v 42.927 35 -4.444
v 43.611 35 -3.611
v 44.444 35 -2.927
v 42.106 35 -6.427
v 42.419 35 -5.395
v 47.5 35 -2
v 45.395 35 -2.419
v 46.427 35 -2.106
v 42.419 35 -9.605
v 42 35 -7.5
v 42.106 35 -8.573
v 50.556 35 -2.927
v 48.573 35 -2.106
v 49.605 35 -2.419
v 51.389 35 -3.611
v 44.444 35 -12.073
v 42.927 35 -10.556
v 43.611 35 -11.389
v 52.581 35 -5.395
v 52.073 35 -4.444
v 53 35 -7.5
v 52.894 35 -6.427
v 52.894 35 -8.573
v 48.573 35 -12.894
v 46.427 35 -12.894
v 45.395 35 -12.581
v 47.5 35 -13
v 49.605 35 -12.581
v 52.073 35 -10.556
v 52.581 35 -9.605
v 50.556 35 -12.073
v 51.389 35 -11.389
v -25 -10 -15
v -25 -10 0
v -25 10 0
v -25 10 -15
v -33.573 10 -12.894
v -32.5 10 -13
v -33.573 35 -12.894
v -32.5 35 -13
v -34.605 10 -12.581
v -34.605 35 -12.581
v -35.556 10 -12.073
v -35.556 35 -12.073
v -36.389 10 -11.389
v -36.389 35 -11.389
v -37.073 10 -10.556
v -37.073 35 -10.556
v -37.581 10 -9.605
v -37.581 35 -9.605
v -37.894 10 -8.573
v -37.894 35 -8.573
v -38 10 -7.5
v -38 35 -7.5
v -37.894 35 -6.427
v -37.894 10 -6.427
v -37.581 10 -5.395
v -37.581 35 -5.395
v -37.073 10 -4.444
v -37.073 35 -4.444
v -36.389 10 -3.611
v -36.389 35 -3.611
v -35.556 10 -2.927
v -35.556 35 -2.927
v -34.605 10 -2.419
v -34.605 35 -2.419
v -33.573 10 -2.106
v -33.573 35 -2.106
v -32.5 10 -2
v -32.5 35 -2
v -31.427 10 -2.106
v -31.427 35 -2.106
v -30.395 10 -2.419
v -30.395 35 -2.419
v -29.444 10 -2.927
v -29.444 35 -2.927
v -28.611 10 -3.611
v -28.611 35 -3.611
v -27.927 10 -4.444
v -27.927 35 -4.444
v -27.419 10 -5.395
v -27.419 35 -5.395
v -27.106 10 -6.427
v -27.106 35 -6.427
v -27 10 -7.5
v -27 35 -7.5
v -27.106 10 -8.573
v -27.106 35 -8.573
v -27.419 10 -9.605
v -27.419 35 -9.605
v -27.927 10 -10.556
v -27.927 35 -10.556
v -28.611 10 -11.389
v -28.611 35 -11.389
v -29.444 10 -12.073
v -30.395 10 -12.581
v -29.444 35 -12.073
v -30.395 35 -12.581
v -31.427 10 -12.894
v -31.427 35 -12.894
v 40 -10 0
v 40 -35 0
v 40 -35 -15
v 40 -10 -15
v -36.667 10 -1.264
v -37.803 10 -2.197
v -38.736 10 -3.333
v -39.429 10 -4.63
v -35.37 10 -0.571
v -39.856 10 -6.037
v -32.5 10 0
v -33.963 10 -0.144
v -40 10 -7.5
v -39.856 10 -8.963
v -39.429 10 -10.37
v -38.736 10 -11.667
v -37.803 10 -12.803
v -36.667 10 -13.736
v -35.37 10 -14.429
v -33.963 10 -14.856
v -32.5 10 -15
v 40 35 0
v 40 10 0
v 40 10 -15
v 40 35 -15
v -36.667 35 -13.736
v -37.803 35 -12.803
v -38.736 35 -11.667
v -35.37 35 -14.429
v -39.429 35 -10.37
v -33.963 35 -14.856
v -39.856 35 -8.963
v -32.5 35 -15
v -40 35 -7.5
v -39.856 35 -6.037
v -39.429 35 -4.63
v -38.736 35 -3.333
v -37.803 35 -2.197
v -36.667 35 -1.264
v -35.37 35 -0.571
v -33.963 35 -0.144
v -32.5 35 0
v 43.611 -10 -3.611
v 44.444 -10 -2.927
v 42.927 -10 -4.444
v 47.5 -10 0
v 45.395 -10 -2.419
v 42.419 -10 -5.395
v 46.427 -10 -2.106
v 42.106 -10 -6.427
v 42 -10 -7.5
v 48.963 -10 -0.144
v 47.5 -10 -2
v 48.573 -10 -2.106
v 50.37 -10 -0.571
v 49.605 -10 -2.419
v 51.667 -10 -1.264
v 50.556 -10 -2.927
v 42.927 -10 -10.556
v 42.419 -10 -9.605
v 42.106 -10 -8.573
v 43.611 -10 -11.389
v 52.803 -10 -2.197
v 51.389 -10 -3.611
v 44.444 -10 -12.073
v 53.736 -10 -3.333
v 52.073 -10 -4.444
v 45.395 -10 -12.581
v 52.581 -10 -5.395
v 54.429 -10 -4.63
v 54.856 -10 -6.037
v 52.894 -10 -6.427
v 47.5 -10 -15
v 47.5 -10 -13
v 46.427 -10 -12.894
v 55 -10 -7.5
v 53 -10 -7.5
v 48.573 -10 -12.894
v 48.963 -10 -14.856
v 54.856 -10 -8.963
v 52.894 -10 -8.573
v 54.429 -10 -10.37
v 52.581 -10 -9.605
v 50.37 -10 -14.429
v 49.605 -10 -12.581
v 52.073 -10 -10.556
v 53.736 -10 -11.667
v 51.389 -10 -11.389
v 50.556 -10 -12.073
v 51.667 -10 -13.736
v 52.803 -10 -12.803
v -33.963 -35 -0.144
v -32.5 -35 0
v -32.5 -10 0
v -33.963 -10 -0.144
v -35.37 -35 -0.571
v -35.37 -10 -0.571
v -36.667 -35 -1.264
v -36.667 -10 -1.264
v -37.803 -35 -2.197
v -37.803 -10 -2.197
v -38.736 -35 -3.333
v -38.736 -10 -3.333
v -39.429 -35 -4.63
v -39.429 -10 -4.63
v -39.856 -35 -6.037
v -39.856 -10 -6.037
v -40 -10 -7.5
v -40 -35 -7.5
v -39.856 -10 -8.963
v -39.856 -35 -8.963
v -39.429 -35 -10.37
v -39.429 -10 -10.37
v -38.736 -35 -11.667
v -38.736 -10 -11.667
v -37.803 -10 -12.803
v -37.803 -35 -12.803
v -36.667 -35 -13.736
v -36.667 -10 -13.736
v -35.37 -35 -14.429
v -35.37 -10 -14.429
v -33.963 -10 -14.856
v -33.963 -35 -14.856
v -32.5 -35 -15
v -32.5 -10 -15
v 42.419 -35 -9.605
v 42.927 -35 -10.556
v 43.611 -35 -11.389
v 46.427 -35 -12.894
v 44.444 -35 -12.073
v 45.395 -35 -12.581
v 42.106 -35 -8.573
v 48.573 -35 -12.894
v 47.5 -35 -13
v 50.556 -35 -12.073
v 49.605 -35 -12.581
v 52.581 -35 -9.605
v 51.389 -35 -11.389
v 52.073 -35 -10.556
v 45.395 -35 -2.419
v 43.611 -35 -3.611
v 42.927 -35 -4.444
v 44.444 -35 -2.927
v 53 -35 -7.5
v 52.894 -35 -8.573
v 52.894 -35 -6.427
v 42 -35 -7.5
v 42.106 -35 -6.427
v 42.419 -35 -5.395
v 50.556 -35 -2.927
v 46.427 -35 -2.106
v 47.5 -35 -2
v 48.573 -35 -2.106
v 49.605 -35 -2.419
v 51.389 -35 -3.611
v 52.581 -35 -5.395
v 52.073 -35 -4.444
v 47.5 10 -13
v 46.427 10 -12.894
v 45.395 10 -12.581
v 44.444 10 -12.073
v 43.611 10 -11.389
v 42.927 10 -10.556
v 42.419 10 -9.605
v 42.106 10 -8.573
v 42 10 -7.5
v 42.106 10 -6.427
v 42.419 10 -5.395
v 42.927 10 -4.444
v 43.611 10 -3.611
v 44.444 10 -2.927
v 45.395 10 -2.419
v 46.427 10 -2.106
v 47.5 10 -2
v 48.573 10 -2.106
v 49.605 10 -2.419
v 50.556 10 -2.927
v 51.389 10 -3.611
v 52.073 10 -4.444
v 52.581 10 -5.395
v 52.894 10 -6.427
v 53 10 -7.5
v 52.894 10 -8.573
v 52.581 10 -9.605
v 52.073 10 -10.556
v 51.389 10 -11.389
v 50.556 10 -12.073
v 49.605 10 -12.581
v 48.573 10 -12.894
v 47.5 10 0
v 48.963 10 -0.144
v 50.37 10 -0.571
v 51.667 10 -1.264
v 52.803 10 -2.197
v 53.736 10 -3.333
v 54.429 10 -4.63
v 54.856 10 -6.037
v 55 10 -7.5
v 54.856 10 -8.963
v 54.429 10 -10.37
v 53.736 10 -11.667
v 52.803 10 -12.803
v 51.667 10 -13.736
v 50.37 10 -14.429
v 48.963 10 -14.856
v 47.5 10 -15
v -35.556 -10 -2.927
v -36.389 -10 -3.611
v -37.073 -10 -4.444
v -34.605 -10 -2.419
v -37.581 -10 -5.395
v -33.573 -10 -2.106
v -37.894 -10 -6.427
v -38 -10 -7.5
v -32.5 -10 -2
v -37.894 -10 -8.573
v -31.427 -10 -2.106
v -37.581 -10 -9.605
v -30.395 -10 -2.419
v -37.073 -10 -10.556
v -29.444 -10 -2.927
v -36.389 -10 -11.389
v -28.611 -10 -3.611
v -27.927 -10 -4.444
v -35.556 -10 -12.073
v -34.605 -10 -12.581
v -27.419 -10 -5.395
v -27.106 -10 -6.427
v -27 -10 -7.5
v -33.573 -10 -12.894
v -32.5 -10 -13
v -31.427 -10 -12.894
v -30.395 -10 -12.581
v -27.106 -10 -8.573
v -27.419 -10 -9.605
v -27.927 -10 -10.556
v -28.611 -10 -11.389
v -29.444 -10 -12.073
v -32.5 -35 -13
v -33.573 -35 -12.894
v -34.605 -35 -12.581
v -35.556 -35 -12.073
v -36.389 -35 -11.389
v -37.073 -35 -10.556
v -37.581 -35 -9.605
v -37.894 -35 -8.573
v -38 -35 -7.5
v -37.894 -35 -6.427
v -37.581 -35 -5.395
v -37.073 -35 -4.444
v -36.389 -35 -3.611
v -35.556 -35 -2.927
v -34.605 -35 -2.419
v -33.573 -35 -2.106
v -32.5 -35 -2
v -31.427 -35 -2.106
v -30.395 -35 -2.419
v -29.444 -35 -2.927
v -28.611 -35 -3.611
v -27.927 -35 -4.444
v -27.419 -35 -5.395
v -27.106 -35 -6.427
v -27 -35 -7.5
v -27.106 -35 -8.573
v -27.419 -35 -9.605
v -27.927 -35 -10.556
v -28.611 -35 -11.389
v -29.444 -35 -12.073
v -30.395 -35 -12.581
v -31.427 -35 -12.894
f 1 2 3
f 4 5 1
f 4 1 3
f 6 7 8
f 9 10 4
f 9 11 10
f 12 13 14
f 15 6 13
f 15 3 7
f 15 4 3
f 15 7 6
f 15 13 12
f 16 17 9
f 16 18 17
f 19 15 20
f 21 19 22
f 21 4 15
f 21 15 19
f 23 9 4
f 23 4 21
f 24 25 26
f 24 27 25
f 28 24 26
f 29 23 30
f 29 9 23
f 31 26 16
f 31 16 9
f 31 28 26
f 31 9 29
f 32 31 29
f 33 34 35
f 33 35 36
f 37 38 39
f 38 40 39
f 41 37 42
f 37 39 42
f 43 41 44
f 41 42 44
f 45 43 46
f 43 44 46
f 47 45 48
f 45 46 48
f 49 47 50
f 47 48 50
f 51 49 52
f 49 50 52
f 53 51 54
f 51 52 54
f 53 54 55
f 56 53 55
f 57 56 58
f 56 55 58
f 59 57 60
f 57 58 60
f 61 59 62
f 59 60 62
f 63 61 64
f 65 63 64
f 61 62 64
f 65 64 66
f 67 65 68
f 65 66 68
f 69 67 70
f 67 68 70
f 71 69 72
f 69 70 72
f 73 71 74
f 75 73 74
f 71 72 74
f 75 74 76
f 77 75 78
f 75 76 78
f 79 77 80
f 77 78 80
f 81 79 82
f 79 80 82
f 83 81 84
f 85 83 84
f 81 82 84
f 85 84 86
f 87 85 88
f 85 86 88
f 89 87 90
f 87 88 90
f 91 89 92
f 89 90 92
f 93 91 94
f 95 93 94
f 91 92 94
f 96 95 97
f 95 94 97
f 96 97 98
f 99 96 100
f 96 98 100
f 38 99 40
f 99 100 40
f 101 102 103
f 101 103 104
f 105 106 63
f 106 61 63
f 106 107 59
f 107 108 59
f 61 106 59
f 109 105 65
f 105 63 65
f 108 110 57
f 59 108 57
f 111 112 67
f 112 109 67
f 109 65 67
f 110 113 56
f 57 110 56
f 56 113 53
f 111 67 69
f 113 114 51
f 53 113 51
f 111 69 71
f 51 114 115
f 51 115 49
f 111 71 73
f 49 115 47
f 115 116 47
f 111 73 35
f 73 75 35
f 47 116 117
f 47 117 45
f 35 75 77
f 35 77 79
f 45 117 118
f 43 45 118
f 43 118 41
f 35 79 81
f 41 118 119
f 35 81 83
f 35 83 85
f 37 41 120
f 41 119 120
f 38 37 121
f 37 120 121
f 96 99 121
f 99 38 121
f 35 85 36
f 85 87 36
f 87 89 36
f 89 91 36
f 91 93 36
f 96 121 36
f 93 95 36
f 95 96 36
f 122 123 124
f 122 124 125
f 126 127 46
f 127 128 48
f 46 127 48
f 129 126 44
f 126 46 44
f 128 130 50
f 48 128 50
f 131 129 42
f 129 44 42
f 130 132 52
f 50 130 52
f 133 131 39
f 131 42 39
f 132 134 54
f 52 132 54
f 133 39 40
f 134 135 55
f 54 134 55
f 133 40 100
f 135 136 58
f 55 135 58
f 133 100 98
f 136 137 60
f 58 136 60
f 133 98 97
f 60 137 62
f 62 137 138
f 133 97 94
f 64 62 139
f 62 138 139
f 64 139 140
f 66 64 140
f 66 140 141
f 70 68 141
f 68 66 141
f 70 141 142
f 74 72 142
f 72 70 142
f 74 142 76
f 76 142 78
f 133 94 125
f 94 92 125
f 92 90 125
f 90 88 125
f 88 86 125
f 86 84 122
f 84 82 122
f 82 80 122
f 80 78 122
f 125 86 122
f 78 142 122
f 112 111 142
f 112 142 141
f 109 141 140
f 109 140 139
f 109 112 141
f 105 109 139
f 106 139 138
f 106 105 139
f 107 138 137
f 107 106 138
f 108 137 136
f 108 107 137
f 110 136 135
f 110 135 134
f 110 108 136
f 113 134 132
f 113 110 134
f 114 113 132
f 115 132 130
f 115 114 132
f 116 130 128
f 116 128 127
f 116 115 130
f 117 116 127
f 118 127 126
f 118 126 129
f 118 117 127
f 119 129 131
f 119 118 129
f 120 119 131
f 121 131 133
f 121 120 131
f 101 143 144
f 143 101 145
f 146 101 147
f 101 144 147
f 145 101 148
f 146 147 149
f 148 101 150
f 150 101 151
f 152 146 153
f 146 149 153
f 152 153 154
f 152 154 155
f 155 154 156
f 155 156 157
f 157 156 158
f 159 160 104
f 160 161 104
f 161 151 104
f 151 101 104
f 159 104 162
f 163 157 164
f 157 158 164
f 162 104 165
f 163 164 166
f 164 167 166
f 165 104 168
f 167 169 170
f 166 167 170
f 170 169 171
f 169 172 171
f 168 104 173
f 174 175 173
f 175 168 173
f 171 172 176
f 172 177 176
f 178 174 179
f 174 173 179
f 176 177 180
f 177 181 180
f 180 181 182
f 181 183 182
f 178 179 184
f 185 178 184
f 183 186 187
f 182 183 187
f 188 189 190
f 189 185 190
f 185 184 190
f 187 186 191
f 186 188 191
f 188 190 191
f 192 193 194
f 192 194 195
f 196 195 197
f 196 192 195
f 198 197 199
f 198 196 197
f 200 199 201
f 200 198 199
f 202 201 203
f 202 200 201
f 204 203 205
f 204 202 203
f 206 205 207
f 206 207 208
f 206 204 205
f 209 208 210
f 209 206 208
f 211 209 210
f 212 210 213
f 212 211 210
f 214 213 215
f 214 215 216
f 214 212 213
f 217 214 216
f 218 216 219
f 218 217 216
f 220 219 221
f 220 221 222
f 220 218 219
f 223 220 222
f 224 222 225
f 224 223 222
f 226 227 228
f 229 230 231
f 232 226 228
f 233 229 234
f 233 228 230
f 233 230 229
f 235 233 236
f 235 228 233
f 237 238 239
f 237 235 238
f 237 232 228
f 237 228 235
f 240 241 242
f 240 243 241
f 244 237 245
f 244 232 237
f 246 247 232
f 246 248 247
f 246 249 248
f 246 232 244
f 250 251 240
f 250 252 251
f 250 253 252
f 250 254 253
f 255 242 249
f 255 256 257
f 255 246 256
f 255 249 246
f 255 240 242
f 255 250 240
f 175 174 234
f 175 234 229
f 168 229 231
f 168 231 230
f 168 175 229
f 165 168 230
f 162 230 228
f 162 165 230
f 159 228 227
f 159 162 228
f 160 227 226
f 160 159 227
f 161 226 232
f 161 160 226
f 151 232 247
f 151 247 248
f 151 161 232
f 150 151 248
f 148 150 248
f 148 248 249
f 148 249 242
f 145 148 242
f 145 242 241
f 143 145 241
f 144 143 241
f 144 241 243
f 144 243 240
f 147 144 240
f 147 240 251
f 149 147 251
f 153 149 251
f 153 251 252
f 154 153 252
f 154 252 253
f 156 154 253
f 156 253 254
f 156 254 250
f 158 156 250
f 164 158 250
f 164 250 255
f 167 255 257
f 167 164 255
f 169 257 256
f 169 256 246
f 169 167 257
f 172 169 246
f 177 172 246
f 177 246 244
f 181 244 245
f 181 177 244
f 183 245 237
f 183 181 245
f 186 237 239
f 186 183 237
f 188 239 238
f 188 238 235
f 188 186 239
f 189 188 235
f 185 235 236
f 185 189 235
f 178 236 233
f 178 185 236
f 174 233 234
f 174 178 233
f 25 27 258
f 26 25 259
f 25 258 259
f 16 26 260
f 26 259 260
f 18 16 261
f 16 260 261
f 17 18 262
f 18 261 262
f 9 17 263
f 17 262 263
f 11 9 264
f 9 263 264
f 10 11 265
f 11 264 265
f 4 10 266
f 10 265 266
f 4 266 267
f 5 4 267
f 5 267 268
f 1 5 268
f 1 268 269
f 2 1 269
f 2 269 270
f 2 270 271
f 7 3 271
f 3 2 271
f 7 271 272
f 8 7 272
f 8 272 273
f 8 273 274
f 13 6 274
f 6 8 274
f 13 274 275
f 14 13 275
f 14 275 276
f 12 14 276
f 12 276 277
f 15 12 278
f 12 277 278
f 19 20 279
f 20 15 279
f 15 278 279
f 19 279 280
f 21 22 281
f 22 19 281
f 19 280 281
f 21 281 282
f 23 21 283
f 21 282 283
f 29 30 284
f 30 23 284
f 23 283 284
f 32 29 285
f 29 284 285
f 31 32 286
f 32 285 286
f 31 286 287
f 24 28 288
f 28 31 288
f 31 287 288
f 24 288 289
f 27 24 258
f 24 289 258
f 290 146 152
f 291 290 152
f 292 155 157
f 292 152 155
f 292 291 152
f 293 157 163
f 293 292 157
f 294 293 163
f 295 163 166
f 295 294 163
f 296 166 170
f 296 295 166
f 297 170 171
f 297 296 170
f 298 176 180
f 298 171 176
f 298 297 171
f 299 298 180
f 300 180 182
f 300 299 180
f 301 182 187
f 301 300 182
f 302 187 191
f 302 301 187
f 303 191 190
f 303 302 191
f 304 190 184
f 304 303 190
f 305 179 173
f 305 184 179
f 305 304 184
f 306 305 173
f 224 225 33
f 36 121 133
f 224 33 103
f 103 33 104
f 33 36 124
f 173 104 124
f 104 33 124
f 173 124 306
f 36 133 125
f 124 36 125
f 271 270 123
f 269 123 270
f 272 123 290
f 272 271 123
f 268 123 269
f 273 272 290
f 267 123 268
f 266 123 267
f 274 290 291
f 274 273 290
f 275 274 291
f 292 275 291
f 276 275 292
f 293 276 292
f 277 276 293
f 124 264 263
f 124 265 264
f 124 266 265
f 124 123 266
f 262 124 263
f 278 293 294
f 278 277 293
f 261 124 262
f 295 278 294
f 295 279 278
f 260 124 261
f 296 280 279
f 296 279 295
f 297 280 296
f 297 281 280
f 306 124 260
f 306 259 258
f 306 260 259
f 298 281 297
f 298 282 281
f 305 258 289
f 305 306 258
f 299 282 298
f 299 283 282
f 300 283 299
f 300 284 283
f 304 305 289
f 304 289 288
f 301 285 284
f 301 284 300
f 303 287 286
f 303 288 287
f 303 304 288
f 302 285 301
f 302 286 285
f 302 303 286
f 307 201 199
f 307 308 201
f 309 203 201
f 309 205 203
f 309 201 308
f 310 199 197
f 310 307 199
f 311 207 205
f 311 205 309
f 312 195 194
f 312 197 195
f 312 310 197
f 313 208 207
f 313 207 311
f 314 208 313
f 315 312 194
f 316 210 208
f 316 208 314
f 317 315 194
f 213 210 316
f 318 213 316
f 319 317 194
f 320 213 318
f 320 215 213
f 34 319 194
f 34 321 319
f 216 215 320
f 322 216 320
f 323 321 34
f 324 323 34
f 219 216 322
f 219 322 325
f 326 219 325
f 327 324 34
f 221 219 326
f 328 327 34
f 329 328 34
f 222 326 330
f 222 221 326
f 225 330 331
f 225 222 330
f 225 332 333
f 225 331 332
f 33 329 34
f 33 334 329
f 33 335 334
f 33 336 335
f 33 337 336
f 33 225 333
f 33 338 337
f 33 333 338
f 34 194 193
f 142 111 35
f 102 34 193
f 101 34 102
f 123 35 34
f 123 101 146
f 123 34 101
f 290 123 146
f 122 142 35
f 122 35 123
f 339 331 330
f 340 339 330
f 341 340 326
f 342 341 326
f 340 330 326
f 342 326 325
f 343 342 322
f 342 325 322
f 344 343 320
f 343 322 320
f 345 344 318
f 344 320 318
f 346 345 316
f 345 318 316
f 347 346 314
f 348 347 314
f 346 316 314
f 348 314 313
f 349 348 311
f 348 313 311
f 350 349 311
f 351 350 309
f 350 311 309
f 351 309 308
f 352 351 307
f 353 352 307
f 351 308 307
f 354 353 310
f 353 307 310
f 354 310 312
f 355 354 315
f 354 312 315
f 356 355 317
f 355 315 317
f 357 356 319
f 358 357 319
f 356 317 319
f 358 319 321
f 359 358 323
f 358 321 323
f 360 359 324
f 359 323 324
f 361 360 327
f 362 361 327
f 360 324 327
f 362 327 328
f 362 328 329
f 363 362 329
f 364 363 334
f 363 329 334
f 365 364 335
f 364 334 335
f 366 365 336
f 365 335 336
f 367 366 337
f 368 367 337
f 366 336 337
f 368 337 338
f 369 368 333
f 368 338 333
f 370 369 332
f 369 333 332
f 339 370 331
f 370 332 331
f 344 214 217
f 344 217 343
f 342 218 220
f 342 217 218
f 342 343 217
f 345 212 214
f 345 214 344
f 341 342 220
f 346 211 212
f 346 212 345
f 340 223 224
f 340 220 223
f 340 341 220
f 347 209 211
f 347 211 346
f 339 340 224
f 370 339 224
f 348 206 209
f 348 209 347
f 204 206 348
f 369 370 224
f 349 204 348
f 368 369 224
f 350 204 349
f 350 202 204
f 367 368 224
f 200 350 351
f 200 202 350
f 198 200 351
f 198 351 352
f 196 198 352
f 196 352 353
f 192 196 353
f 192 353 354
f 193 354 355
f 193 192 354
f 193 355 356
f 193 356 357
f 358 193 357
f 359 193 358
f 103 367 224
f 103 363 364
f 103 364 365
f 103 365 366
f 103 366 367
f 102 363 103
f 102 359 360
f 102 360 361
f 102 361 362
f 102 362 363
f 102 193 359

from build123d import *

# Parameters (mm, degrees)
PLATE_SKETCH_W                 = 80
PLATE_SKETCH_H                 = 70
PLATE_EXTRUDE_DEPTH            = 15
HOLE_CUT_REACH                 = 57.227
HOLE_SKETCH_R                  = 5.5
HOLE_CUT_DIRECTION_2_REACH     = 57.227
FEMALE_FILLET_RADIUS           = 7.5
FEMALE_FILLET_LENGTH           = 70
GAP_CUT_DEPTH                  = 10
GAP_CUT_DEPTH_BACK             = 10
GAP_SKETCH_W                   = 15
GAP_SKETCH_H                   = 15
PIN_SUPPORT_EXTRUDE_DEPTH      = 10
PIN_SUPPORT_EXTRUDE_DEPTH_BACK = 10
PIN_SUPPORT_SKETCH_W           = 15
PIN_SUPPORT_SKETCH_H           = 15
PIN_EXTRUDE_REACH              = 74.629
PIN_SKETCH_R                   = 5.5
PIN_EXTRUDE_DIRECTION_2_REACH  = 74.629
MALE_FILLET_RADIUS             = 7.5
MALE_FILLET_LENGTH             = 20


with BuildPart() as part:
    # Plate Sketch → Plate Extrude (new body)
    with BuildSketch(Plane.XY):
        Rectangle(PLATE_SKETCH_W, PLATE_SKETCH_H)
    extrude(amount=-PLATE_EXTRUDE_DEPTH)

    # Hole Cut: up to this face of the body (flat: up to its plane)
    hole_cut_end = Plane(part.part.faces().sort_by_distance((0, 35, -7.5))[0])
    # Hole Sketch → Hole Cut (cut, up to the picked face)
    with BuildSketch(Plane(origin=(0, 0, 0), x_dir=(1, 0, 0), z_dir=(0, 1, 0)), mode=Mode.PRIVATE) as hole_cut_sk1:
        with Locations(Location((-32.5, 7.5, 0), (0, 0, 90))):
            Circle(HOLE_SKETCH_R)
    hole_cut_tool1 = split(extrude(hole_cut_sk1.sketch, amount=HOLE_CUT_REACH, mode=Mode.PRIVATE), bisect_by=hole_cut_end, keep=Keep.BOTH, mode=Mode.PRIVATE)
    add(hole_cut_tool1.solids().sort_by(Axis((-32.5, 0, -7.5), (0, 1, 0)))[0], mode=Mode.SUBTRACT)

    # Hole Cut direction 2: up to this face of the body (flat: up to its plane)
    hole_cut_direction_2_end = Plane(part.part.faces().sort_by_distance((0, -35, -7.5))[0])
    # Hole Sketch → Hole Cut direction 2 (cut, up to the picked face)
    with BuildSketch(Plane(origin=(0, 0, 0), x_dir=(1, 0, 0), z_dir=(0, 1, 0)), mode=Mode.PRIVATE) as hole_cut_direction_2_sk1:
        with Locations(Location((-32.5, 7.5, 0), (0, 0, 90))):
            Circle(HOLE_SKETCH_R)
    hole_cut_direction_2_tool1 = split(extrude(hole_cut_direction_2_sk1.sketch, amount=-HOLE_CUT_DIRECTION_2_REACH, mode=Mode.PRIVATE), bisect_by=hole_cut_direction_2_end, keep=Keep.BOTH, mode=Mode.PRIVATE)
    add(hole_cut_direction_2_tool1.solids().sort_by(Axis((-32.5, 0, -7.5), (0, -1, 0)))[0], mode=Mode.SUBTRACT)

    # Female Fillet: full round fillet: the end face becomes a half cylinder, R = half its width
    female_fillet_face = Plane((-40, 0, -7.5), x_dir=(0, -1, 0), z_dir=(-1, 0, 0))  # on the end face: x along it, z out of the body
    female_fillet_slab = female_fillet_face.offset(-FEMALE_FILLET_RADIUS / 2) * Box(FEMALE_FILLET_LENGTH, 2 * FEMALE_FILLET_RADIUS, FEMALE_FILLET_RADIUS, mode=Mode.PRIVATE)  # the body's end, R deep
    female_fillet_round = Plane((-32.5, 0, -7.5), x_dir=(-1, 0, 0), z_dir=(0, -1, 0)) * Cylinder(FEMALE_FILLET_RADIUS, FEMALE_FILLET_LENGTH, mode=Mode.PRIVATE)  # its axis R under the face
    add(female_fillet_slab - female_fillet_round, mode=Mode.SUBTRACT)

    # Gap Sketch → Gap Cut (cut, two sides: drawn at the far end of the back side and taken through both)
    with BuildSketch(Plane(origin=(0, 0, 0), x_dir=(1, 0, 0), z_dir=(0, 1, 0)).offset(-GAP_CUT_DEPTH_BACK)):
        with Locations((-32.5, 7.5)):
            Rectangle(GAP_SKETCH_W, GAP_SKETCH_H)
    extrude(amount=GAP_CUT_DEPTH + GAP_CUT_DEPTH_BACK, mode=Mode.SUBTRACT)

    # Pin Support Sketch → Pin Support Extrude (add, two sides: drawn at the far end of the back side and taken through both)
    with BuildSketch(Plane(origin=(0, 0, 0), x_dir=(1, 0, 0), z_dir=(0, 1, 0)).offset(-PIN_SUPPORT_EXTRUDE_DEPTH_BACK)):
        with Locations((47.5, 7.5)):
            Rectangle(PIN_SUPPORT_SKETCH_W, PIN_SUPPORT_SKETCH_H)
    extrude(amount=PIN_SUPPORT_EXTRUDE_DEPTH + PIN_SUPPORT_EXTRUDE_DEPTH_BACK)

    # Pin Extrude: up to this face of the body (flat: up to its plane)
    pin_extrude_end = Plane(part.part.faces().sort_by_distance((3.713685867, 35, -7.5))[0])
    # Pin Sketch → Pin Extrude (add, up to the picked face)
    with BuildSketch(Plane(origin=(0, 10, 0), x_dir=(1, 0, 0), z_dir=(0, 1, 0)), mode=Mode.PRIVATE) as pin_extrude_sk1:
        with Locations(Location((47.5, 7.5, 0), (0, 0, 90))):
            Circle(PIN_SKETCH_R)
    pin_extrude_tool1 = split(extrude(pin_extrude_sk1.sketch, amount=PIN_EXTRUDE_REACH, mode=Mode.PRIVATE), bisect_by=pin_extrude_end, keep=Keep.BOTH, mode=Mode.PRIVATE)
    add(pin_extrude_tool1.solids().sort_by(Axis((47.5, 10, -7.5), (0, 1, 0)))[0])

    # Pin Extrude direction 2: up to this face of the body (flat: up to its plane)
    pin_extrude_direction_2_end = Plane(part.part.faces().sort_by_distance((3.713685867, -35, -7.5))[0])
    # Pin Sketch → Pin Extrude direction 2 (add, up to the picked face)
    with BuildSketch(Plane(origin=(0, 10, 0), x_dir=(1, 0, 0), z_dir=(0, 1, 0)), mode=Mode.PRIVATE) as pin_extrude_direction_2_sk1:
        with Locations(Location((47.5, 7.5, 0), (0, 0, 90))):
            Circle(PIN_SKETCH_R)
    pin_extrude_direction_2_tool1 = split(extrude(pin_extrude_direction_2_sk1.sketch, amount=-PIN_EXTRUDE_DIRECTION_2_REACH, mode=Mode.PRIVATE), bisect_by=pin_extrude_direction_2_end, keep=Keep.BOTH, mode=Mode.PRIVATE)
    add(pin_extrude_direction_2_tool1.solids().sort_by(Axis((47.5, 10, -7.5), (0, -1, 0)))[0])

    # Male Fillet: full round fillet: the end face becomes a half cylinder, R = half its width
    male_fillet_face = Plane((55, 0, -7.5), x_dir=(0, 1, 0), z_dir=(1, 0, 0))  # on the end face: x along it, z out of the body
    male_fillet_slab = male_fillet_face.offset(-MALE_FILLET_RADIUS / 2) * Box(MALE_FILLET_LENGTH, 2 * MALE_FILLET_RADIUS, MALE_FILLET_RADIUS, mode=Mode.PRIVATE)  # the body's end, R deep
    male_fillet_round = Plane((47.5, 0, -7.5), x_dir=(1, 0, 0), z_dir=(0, 1, 0)) * Cylinder(MALE_FILLET_RADIUS, MALE_FILLET_LENGTH, mode=Mode.PRIVATE)  # its axis R under the face
    add(male_fillet_slab - male_fillet_round, mode=Mode.SUBTRACT)


solid = part.part
